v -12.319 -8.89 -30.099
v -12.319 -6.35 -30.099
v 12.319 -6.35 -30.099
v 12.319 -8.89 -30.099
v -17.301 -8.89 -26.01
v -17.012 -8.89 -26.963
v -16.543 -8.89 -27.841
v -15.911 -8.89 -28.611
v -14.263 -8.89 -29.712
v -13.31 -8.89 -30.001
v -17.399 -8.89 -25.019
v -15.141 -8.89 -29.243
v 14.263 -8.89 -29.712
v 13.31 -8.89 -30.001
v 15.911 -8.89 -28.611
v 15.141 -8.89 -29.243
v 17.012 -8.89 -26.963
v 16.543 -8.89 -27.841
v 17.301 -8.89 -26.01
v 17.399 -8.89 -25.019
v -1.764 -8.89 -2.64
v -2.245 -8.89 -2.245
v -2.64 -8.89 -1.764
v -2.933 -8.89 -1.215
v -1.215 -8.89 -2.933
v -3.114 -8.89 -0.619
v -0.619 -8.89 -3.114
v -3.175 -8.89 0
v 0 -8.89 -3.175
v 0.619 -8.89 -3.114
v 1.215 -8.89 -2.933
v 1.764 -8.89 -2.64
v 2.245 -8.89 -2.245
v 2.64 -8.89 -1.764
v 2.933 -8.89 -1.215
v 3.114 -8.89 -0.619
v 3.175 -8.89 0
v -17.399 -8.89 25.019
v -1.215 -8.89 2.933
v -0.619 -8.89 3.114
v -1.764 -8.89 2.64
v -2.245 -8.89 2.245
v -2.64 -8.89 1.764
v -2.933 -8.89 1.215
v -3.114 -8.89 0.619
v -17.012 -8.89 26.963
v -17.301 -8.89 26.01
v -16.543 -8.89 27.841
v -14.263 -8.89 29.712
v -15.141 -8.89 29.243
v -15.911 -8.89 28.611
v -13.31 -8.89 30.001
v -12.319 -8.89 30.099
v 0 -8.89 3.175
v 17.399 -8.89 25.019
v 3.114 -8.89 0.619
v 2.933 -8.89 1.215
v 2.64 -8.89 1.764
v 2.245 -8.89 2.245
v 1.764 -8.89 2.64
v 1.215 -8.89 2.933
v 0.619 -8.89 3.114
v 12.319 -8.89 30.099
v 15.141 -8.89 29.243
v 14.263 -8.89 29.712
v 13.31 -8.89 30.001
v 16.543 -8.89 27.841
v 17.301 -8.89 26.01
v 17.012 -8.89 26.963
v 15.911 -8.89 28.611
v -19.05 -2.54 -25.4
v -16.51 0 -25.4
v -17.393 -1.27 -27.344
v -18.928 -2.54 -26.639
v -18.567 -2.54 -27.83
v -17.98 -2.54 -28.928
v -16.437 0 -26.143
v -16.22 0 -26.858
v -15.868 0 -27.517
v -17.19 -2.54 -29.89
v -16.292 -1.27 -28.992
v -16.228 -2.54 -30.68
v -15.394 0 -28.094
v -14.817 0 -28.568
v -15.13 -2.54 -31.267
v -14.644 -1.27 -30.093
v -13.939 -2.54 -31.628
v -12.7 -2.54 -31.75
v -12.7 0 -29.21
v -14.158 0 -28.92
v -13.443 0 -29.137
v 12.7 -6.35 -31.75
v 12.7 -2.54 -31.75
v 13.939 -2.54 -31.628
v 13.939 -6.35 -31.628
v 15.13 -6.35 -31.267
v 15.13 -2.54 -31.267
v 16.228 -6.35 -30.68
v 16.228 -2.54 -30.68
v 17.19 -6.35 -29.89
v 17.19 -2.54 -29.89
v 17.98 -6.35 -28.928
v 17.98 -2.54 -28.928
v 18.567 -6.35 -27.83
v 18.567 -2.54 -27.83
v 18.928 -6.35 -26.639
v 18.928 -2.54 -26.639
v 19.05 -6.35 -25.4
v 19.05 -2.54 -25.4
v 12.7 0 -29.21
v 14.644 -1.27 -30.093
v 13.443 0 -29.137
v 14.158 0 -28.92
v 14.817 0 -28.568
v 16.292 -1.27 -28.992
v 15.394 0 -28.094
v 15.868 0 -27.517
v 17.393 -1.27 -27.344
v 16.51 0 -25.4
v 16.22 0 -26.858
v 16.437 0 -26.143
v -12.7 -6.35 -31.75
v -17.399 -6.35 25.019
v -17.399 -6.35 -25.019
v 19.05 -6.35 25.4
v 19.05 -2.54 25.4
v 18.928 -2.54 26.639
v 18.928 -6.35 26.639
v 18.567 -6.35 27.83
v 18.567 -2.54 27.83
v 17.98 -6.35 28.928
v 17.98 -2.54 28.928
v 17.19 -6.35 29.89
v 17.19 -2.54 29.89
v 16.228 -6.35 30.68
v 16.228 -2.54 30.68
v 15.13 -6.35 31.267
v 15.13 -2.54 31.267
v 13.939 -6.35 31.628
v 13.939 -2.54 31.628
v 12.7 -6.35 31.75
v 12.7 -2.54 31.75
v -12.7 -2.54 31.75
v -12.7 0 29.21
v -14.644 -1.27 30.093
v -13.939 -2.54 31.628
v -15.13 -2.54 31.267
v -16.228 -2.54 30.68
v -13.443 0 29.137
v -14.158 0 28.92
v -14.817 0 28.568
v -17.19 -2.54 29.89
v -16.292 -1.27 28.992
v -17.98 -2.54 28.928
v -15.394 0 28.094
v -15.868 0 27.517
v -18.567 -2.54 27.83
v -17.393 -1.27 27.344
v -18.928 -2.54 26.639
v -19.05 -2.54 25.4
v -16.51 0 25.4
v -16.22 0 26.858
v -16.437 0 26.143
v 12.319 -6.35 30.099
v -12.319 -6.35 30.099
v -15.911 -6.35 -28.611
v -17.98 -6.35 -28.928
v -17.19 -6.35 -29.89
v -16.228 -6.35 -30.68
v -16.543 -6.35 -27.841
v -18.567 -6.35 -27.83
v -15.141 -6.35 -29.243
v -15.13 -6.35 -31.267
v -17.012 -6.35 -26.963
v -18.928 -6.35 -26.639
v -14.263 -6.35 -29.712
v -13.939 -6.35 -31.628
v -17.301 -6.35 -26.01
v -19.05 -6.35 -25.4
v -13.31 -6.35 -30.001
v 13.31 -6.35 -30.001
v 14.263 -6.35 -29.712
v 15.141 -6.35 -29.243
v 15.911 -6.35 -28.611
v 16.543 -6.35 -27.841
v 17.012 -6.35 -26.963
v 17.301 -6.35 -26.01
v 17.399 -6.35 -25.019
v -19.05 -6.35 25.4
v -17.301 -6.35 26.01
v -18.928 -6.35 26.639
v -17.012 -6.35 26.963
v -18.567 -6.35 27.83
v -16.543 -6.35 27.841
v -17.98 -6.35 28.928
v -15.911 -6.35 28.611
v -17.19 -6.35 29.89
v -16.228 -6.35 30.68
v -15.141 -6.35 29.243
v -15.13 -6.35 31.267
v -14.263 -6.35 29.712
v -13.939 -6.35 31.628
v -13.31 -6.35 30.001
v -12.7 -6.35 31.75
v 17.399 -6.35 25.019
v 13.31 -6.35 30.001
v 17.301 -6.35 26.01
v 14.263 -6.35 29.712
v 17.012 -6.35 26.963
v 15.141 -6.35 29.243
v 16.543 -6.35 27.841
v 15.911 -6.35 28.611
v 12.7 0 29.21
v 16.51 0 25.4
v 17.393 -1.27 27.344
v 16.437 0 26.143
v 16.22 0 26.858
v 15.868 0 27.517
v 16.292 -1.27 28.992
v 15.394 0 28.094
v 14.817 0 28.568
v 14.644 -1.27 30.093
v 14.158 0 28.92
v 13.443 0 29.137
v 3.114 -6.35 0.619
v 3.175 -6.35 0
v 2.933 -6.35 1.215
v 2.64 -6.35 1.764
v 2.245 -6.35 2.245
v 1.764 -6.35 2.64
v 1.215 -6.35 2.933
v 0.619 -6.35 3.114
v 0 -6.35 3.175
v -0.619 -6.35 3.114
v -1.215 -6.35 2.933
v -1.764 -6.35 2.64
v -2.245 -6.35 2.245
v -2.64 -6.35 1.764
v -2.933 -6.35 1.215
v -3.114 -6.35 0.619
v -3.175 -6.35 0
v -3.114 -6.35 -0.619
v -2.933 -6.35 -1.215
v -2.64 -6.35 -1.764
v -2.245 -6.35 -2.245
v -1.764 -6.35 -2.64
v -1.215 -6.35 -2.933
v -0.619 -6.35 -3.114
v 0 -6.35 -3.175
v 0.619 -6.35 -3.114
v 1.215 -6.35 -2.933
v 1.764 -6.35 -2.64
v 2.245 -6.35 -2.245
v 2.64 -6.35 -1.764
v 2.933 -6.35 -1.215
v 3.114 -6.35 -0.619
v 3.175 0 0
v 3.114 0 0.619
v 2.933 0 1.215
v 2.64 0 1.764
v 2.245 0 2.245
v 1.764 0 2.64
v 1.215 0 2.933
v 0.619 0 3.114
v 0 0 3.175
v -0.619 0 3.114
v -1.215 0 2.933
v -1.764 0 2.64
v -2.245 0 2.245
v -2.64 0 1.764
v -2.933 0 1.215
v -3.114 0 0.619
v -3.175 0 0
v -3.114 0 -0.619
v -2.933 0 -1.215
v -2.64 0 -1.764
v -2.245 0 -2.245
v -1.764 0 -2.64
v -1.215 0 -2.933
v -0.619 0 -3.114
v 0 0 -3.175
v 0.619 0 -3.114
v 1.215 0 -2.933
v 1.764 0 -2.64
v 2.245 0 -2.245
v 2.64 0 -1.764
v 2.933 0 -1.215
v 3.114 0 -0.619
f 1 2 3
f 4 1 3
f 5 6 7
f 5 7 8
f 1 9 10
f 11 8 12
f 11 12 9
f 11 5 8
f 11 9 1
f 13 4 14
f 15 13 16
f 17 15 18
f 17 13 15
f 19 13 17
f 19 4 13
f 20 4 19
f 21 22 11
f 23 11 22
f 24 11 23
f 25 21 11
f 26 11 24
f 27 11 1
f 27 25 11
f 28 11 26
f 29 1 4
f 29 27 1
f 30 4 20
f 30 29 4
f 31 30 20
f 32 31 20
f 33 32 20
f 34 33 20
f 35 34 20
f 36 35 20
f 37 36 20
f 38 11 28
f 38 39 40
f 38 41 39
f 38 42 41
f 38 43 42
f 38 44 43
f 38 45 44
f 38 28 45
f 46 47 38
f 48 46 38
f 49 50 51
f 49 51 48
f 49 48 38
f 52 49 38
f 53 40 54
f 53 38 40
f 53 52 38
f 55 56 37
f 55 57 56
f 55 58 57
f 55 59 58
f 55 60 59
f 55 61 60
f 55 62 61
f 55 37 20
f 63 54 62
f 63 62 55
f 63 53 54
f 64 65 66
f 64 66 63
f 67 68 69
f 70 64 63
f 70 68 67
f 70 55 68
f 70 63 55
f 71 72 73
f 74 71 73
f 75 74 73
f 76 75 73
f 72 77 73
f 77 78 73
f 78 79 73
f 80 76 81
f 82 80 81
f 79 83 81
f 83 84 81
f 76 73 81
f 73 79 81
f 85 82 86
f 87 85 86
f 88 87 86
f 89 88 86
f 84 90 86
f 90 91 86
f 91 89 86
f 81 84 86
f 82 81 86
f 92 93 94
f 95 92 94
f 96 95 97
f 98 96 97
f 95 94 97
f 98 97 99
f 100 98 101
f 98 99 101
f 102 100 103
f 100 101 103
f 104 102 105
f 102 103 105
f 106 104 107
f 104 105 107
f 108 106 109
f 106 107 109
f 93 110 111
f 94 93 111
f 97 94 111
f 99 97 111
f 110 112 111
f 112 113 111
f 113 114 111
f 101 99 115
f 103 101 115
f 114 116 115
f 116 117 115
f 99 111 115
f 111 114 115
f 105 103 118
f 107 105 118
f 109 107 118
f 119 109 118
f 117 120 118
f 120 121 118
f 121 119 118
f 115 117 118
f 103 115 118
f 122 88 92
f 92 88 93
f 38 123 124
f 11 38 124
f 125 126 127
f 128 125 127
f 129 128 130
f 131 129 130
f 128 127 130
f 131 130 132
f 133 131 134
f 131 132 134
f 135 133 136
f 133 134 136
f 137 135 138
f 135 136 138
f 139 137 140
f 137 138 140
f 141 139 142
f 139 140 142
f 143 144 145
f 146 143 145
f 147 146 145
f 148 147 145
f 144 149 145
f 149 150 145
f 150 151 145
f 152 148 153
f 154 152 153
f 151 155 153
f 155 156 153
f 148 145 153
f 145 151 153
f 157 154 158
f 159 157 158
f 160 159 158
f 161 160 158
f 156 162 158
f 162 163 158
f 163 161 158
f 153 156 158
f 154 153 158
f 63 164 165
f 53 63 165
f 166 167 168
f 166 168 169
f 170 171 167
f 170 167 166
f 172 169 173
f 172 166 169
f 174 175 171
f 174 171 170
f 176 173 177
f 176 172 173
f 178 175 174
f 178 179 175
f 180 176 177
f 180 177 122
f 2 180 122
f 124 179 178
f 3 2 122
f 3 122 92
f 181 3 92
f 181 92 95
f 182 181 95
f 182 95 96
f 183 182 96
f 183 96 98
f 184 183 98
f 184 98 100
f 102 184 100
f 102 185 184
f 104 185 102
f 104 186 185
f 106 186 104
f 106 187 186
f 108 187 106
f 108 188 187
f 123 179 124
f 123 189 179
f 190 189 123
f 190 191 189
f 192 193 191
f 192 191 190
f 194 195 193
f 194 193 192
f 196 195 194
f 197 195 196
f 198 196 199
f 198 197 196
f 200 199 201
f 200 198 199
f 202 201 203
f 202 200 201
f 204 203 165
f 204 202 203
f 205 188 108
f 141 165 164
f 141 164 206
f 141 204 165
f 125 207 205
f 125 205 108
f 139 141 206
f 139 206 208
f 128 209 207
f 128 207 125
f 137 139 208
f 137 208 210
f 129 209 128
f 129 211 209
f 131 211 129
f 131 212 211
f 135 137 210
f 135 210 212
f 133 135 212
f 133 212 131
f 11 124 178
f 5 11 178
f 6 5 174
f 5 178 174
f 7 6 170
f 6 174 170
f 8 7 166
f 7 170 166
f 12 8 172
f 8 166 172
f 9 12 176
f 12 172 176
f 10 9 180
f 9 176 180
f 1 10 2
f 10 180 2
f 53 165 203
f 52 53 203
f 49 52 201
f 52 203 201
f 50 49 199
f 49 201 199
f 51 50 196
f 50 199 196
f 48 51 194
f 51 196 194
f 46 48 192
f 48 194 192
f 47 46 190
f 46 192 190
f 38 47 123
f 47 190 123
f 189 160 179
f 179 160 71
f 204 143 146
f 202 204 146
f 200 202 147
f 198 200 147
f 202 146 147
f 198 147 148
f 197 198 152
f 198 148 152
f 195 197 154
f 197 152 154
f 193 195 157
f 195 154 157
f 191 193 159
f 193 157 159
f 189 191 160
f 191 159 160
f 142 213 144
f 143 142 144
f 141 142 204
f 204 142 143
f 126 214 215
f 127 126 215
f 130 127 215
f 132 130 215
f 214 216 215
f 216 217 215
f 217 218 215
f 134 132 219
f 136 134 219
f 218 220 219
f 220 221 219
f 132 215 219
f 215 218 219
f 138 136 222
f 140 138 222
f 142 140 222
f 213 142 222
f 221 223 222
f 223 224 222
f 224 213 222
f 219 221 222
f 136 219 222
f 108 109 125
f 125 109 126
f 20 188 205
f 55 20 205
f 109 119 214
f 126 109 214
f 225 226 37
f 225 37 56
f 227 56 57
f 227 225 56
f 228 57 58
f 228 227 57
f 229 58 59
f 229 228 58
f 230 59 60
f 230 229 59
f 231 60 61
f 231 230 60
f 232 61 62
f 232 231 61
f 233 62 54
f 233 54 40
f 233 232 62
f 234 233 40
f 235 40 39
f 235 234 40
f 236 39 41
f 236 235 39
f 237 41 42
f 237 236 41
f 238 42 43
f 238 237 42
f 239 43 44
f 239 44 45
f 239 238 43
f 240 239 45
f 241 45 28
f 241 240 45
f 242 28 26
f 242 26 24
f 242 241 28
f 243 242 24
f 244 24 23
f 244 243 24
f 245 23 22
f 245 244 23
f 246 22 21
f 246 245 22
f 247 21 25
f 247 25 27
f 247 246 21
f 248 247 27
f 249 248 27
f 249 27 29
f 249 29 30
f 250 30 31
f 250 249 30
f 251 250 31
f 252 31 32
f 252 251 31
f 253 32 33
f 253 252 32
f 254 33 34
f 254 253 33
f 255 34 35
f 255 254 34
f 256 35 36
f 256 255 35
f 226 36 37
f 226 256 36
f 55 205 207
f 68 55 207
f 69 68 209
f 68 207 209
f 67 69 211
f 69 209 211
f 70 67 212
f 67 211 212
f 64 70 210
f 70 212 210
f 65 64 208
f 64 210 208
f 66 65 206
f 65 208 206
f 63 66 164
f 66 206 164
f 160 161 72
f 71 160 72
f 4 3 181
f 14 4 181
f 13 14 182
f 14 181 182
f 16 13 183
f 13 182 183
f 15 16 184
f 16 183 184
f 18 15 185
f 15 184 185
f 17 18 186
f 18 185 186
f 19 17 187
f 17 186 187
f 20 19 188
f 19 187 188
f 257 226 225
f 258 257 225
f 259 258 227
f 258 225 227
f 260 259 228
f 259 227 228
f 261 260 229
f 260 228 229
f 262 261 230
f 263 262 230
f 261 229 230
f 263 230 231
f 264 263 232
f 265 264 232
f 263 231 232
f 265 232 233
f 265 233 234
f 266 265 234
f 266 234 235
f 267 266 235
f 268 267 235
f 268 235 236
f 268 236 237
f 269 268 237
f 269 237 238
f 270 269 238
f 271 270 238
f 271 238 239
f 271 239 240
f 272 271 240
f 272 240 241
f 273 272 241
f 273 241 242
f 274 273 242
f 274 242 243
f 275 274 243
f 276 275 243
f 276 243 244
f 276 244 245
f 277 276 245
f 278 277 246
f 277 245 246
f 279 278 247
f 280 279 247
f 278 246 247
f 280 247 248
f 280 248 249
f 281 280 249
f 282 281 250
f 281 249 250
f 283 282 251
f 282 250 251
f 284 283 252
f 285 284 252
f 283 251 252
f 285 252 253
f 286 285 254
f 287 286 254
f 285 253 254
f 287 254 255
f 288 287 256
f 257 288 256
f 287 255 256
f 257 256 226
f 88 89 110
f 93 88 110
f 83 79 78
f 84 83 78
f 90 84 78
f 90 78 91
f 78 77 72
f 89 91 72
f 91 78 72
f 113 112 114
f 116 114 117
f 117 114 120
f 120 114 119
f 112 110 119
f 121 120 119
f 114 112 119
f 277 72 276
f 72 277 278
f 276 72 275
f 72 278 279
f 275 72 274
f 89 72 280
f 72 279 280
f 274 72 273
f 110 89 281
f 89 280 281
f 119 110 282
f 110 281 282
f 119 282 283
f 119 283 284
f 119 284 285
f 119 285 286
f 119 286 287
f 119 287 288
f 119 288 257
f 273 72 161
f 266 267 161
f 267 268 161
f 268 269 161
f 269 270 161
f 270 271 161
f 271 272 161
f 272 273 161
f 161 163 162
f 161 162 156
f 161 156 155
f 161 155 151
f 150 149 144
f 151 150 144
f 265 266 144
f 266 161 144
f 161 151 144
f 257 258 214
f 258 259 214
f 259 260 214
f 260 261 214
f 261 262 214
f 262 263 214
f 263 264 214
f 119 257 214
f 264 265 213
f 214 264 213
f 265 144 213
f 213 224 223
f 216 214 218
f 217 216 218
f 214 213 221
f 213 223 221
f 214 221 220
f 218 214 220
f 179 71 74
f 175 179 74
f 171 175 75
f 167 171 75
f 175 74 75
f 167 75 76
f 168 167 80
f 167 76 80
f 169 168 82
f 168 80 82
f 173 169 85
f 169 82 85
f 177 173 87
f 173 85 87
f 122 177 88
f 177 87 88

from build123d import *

# Parameters (mm, degrees)
F1_DEPTH = 6.35
F2_R     = 3.175
F3_DEPTH = 25.4
F4_R     = 3.175
F5_DEPTH = 2.54
F6_SIZE  = 2.54


with BuildPart() as f1:
    # F0 (on Front) → F1 (new body)
    with BuildSketch(Plane.XZ):
        with BuildLine():
            ThreePointArc((19.05, 25.4), (17.1901280605, 29.8901280605), (12.7, 31.75))
            Line((12.7, 31.75), (-12.7, 31.75))
            ThreePointArc((-12.7, 31.75), (-17.1901280605, 29.8901280605), (-19.05, 25.4))
            Line((-19.05, 25.4), (-19.05, -25.4))
            ThreePointArc((-19.05, -25.4), (-17.1901280605, -29.8901280605), (-12.7, -31.75))
            Line((-12.7, -31.75), (12.7, -31.75))
            ThreePointArc((12.7, -31.75), (17.1901280605, -29.8901280605), (19.05, -25.4))
            Line((19.05, -25.4), (19.05, 25.4))
        make_face()
    extrude(amount=F1_DEPTH)

    # F2 (on face) → F3 (cut)
    with BuildSketch(Plane.XZ.offset(6.35)):
        Circle(F2_R)
    extrude(amount=-F3_DEPTH, mode=Mode.SUBTRACT)

    # F4 (on face) → F5 (join)
    with BuildSketch(Plane.XZ.offset(6.35)):
        with BuildLine():
            ThreePointArc((-12.319, 30.099), (-15.9111024484, 28.6111024484), (-17.399, 25.019))
            Line((-17.399, 25.019), (-17.399, -25.019))
            ThreePointArc((-17.399, -25.019), (-15.9111024484, -28.6111024484), (-12.319, -30.099))
            Line((-12.319, -30.099), (12.319, -30.099))
            ThreePointArc((12.319, -30.099), (15.9111024484, -28.6111024484), (17.399, -25.019))
            Line((17.399, -25.019), (17.399, 25.019))
            ThreePointArc((17.399, 25.019), (15.9111024484, 28.6111024484), (12.319, 30.099))
            Line((12.319, 30.099), (-12.319, 30.099))
        make_face()
        Circle(F4_R, mode=Mode.SUBTRACT)
    extrude(amount=F5_DEPTH)

    # F6
    f6_edges = [f1.edges().sort_by_distance(p)[0] for p in [
        (-19.05, 0, 0),
    ]]
    chamfer(f6_edges, length=F6_SIZE)


solid = f1.part
